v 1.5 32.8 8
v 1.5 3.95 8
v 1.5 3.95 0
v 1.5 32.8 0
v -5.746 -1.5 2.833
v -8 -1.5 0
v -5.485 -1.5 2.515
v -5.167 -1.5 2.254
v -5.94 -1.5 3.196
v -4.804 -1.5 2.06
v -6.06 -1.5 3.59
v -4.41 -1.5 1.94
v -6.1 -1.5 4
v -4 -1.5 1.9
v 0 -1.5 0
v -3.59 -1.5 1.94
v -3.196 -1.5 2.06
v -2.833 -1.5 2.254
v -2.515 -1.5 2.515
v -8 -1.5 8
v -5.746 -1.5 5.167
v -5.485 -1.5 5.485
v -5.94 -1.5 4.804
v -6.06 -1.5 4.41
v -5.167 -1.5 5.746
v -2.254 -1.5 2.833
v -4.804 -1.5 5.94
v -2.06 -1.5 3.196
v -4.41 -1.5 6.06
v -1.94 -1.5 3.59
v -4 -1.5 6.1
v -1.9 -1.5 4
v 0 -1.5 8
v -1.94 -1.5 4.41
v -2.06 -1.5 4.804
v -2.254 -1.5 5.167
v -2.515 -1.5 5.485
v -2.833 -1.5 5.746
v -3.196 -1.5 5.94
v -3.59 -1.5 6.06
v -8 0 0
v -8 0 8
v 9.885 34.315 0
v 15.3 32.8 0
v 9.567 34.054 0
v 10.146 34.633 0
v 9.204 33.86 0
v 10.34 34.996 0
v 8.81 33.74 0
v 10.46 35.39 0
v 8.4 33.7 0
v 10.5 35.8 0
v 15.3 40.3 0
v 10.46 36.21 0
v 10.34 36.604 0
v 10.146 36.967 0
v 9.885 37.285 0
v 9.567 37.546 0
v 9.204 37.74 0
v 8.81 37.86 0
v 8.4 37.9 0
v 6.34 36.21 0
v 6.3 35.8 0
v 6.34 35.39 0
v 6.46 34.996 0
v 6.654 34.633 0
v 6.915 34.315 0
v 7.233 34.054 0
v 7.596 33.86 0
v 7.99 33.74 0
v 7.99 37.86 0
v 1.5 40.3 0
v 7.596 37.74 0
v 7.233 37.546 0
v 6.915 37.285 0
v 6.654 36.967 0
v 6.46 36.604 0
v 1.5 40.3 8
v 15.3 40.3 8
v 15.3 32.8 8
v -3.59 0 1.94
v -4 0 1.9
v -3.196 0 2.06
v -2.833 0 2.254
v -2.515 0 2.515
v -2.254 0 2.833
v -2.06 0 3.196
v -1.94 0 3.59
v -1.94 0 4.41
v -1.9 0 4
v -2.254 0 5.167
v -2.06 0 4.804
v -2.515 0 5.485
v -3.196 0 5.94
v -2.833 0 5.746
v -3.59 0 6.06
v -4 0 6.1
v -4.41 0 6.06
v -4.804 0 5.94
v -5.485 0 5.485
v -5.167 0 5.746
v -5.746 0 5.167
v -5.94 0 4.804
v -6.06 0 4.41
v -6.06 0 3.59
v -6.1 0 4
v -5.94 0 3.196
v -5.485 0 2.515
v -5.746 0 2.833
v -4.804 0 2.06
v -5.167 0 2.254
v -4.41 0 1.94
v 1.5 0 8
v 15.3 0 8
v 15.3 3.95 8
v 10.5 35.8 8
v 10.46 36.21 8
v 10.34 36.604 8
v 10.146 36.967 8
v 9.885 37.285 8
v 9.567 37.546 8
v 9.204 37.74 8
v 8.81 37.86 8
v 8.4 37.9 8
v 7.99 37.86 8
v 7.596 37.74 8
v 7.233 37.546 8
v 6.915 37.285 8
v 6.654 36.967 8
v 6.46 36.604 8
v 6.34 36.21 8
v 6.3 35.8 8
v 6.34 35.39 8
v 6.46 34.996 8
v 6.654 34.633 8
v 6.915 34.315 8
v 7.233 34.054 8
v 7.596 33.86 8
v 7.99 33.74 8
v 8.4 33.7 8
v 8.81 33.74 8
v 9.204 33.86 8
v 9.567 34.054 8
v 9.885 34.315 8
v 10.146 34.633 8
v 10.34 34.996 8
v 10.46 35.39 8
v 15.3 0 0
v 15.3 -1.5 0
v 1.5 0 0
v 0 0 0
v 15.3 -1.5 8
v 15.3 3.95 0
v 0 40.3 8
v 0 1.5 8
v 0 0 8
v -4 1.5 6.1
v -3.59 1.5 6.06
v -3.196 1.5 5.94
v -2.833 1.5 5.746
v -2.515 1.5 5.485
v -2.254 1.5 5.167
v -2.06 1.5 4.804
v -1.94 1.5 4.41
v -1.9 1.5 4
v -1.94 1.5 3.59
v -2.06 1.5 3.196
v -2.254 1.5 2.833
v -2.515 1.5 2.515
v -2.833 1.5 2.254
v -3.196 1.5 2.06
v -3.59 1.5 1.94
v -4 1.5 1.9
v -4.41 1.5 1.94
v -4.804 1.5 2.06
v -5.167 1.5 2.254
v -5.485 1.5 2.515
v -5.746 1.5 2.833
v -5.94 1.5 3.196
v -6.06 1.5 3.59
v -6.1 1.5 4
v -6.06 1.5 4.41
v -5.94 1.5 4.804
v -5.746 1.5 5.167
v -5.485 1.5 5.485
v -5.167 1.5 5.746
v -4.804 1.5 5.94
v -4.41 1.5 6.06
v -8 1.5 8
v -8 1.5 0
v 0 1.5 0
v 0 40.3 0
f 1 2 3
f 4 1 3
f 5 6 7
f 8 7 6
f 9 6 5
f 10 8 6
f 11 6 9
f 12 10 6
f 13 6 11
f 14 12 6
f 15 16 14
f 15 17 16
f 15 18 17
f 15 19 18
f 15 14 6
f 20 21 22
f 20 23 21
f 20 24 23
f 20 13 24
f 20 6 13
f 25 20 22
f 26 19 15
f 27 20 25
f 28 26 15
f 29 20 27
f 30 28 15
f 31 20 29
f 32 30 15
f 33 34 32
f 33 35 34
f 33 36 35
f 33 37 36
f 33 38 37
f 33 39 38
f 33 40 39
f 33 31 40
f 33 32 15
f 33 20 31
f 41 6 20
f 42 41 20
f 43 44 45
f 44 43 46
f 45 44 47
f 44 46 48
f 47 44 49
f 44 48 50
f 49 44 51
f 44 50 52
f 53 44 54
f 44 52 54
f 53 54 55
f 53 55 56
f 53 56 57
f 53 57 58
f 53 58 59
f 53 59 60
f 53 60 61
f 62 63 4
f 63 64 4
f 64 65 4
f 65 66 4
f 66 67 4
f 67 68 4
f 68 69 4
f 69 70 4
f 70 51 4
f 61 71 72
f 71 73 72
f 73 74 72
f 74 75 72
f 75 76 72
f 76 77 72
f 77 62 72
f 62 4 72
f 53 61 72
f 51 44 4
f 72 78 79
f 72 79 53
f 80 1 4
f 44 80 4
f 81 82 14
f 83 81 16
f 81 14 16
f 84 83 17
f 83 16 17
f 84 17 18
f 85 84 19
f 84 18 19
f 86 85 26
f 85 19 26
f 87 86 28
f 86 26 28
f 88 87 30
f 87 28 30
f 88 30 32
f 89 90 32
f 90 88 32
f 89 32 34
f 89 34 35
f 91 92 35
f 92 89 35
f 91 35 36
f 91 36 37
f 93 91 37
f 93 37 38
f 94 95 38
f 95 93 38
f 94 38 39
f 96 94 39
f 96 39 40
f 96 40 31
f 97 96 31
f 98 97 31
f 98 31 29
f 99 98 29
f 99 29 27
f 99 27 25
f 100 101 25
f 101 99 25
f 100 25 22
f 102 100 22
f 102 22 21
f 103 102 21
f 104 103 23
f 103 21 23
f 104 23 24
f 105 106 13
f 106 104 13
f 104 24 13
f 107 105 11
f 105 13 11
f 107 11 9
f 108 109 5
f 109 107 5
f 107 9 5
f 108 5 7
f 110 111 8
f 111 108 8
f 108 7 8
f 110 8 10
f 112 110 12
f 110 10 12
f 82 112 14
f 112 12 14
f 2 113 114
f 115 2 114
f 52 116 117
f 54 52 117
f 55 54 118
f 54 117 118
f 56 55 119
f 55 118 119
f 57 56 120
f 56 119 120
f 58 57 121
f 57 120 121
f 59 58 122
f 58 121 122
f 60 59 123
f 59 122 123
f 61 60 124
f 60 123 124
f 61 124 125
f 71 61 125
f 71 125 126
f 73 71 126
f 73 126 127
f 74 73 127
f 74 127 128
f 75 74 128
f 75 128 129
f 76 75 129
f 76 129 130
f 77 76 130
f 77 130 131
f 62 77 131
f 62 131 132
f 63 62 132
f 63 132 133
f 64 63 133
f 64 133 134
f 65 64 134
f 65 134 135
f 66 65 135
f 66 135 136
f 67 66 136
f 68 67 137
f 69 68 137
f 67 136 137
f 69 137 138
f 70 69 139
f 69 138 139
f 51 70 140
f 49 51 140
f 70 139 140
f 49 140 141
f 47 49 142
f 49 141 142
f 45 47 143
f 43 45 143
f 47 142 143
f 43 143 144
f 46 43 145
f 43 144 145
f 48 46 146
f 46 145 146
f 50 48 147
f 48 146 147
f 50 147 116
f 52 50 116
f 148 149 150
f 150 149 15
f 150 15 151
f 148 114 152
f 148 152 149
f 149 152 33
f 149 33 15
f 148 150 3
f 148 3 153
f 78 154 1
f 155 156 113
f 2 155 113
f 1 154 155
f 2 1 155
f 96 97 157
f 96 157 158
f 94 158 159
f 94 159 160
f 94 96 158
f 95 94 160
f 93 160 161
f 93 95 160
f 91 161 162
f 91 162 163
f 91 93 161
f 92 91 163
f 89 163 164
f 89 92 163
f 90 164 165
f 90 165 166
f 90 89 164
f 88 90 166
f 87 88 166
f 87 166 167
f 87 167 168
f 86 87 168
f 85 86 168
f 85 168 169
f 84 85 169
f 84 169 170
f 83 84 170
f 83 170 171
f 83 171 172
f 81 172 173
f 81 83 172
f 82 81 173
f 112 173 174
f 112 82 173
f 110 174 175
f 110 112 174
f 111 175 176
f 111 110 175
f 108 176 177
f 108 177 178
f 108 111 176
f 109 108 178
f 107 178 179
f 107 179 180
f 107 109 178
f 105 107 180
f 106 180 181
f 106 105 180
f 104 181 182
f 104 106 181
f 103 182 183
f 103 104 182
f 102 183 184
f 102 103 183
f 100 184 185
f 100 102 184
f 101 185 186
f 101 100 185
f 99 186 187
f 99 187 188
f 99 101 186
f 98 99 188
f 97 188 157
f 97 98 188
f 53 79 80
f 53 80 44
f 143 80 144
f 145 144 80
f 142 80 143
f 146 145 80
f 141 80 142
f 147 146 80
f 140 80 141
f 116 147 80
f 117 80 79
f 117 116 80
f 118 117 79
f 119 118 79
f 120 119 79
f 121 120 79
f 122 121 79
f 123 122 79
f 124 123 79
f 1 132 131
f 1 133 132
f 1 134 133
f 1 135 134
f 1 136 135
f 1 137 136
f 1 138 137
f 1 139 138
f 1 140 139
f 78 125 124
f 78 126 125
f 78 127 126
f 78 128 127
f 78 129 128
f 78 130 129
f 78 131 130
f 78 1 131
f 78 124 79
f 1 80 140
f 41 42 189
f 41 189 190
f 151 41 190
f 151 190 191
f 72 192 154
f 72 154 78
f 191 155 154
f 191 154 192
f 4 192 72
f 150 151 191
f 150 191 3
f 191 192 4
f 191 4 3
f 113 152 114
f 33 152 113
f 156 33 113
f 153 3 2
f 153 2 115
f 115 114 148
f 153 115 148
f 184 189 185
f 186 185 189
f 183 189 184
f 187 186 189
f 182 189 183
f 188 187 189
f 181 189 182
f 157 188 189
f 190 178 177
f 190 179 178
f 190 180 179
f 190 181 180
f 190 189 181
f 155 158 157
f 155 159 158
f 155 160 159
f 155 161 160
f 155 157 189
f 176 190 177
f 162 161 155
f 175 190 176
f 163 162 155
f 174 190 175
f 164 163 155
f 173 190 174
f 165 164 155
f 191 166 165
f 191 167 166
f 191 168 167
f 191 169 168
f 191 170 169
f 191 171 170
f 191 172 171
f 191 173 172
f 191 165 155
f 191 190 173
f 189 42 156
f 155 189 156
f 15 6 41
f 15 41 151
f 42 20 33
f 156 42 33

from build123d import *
from build123d.topology import SkipClean

# Parameters (mm, degrees)
SKETCH1_W            = 8
SKETCH1_H            = 8
SKETCH1_R            = 2.1
BOSS_EXTRUDE6_DEPTH  = 1.5
SKETCH6_W            = 8
SKETCH6_H            = 1.5
BOSS_EXTRUDE7_DEPTH  = 15.3
BOSS_EXTRUDE8_START  = 1.5
SKETCH10_W           = 8
SKETCH10_H           = 8
SKETCH10_R           = 2.1
BOSS_EXTRUDE8_DEPTH  = 1.5
SKETCH11_W           = 1.5
SKETCH11_H           = 8
BOSS_EXTRUDE9_DEPTH  = 40.3
SKETCH12_W           = 8
SKETCH12_H           = 7.5
BOSS_EXTRUDE10_DEPTH = 13.8
SKETCH14_R           = 2.1
CUT_EXTRUDE1_DEPTH   = 13.8
SKETCH15_W           = 13.8
SKETCH15_H           = 8
BOSS_EXTRUDE11_DEPTH = 3.95


with BuildPart() as part:
    # Sketch1 → Boss-Extrude6 (new body)
    with BuildSketch(Plane(origin=(0, 0, 0), x_dir=(1, 0, 0), z_dir=(0, 1, 0))):
        with Locations((-4, -4)):
            Rectangle(SKETCH1_W, SKETCH1_H)
        with Locations(Location((-4, -4, 0), (0, 0, 270))):
            Circle(SKETCH1_R, mode=Mode.SUBTRACT)
    extrude(amount=BOSS_EXTRUDE6_DEPTH)



with BuildPart() as body_2:
    # Sketch6 → Boss-Extrude7 (new body)
    with BuildSketch(Plane(origin=(0, 0, 0), x_dir=(0, 0, -1), z_dir=(1, 0, 0))):
        with Locations((-4, -0.75)):
            Rectangle(SKETCH6_W, SKETCH6_H)
    extrude(amount=BOSS_EXTRUDE7_DEPTH)


with BuildPart() as part_1:
    with SkipClean():  # the faces are left unmerged after this step: merging them gives an invalid solid
        add(part.part)

        add(body_2.part)  # Boss-Extrude8 merges body 2
        # Sketch10 → Boss-Extrude8 (add)
        with BuildSketch(Plane.XZ.offset(BOSS_EXTRUDE8_START)):
            with Locations((-4, 4)):
                Rectangle(SKETCH10_W, SKETCH10_H)
            with Locations(Location((-4, 4, 0), (0, 0, 270))):
                Circle(SKETCH10_R, mode=Mode.SUBTRACT)
        extrude(amount=-BOSS_EXTRUDE8_DEPTH)

    # Sketch11 → Boss-Extrude9 (add)
    with SkipClean():  # the faces are left unmerged after this step: merging them gives an invalid solid
        with BuildSketch(Plane(origin=(0, 0, 0), x_dir=(1, 0, 0), z_dir=(0, 1, 0))):
            with Locations((0.75, -4)):
                Rectangle(SKETCH11_W, SKETCH11_H)
        extrude(amount=BOSS_EXTRUDE9_DEPTH)

    # Sketch12 → Boss-Extrude10 (add)
    with SkipClean():  # the faces are left unmerged after this step: merging them gives an invalid solid
        with BuildSketch(Plane(origin=(1.5, 0, 0), x_dir=(0, 0, -1), z_dir=(1, 0, 0))):
            with Locations((-4, 36.55)):
                Rectangle(SKETCH12_W, SKETCH12_H)
        extrude(amount=BOSS_EXTRUDE10_DEPTH)

    # Sketch14 → Cut-Extrude1 (cut)
    with SkipClean():  # the faces are left unmerged after this step: merging them gives an invalid solid
        with BuildSketch(Plane.XY.offset(8)):
            with Locations((8.4, 35.8)):
                Circle(SKETCH14_R)
        extrude(amount=-CUT_EXTRUDE1_DEPTH, mode=Mode.SUBTRACT)

    # Sketch15 → Boss-Extrude11 (add)
    with SkipClean():  # the faces are left unmerged after this step: merging them gives an invalid solid
        with BuildSketch(Plane(origin=(0, 0, 0), x_dir=(1, 0, 0), z_dir=(0, 1, 0))):
            with Locations((8.4, -4)):
                Rectangle(SKETCH15_W, SKETCH15_H)
        extrude(amount=BOSS_EXTRUDE11_DEPTH)


solid = part_1.part
